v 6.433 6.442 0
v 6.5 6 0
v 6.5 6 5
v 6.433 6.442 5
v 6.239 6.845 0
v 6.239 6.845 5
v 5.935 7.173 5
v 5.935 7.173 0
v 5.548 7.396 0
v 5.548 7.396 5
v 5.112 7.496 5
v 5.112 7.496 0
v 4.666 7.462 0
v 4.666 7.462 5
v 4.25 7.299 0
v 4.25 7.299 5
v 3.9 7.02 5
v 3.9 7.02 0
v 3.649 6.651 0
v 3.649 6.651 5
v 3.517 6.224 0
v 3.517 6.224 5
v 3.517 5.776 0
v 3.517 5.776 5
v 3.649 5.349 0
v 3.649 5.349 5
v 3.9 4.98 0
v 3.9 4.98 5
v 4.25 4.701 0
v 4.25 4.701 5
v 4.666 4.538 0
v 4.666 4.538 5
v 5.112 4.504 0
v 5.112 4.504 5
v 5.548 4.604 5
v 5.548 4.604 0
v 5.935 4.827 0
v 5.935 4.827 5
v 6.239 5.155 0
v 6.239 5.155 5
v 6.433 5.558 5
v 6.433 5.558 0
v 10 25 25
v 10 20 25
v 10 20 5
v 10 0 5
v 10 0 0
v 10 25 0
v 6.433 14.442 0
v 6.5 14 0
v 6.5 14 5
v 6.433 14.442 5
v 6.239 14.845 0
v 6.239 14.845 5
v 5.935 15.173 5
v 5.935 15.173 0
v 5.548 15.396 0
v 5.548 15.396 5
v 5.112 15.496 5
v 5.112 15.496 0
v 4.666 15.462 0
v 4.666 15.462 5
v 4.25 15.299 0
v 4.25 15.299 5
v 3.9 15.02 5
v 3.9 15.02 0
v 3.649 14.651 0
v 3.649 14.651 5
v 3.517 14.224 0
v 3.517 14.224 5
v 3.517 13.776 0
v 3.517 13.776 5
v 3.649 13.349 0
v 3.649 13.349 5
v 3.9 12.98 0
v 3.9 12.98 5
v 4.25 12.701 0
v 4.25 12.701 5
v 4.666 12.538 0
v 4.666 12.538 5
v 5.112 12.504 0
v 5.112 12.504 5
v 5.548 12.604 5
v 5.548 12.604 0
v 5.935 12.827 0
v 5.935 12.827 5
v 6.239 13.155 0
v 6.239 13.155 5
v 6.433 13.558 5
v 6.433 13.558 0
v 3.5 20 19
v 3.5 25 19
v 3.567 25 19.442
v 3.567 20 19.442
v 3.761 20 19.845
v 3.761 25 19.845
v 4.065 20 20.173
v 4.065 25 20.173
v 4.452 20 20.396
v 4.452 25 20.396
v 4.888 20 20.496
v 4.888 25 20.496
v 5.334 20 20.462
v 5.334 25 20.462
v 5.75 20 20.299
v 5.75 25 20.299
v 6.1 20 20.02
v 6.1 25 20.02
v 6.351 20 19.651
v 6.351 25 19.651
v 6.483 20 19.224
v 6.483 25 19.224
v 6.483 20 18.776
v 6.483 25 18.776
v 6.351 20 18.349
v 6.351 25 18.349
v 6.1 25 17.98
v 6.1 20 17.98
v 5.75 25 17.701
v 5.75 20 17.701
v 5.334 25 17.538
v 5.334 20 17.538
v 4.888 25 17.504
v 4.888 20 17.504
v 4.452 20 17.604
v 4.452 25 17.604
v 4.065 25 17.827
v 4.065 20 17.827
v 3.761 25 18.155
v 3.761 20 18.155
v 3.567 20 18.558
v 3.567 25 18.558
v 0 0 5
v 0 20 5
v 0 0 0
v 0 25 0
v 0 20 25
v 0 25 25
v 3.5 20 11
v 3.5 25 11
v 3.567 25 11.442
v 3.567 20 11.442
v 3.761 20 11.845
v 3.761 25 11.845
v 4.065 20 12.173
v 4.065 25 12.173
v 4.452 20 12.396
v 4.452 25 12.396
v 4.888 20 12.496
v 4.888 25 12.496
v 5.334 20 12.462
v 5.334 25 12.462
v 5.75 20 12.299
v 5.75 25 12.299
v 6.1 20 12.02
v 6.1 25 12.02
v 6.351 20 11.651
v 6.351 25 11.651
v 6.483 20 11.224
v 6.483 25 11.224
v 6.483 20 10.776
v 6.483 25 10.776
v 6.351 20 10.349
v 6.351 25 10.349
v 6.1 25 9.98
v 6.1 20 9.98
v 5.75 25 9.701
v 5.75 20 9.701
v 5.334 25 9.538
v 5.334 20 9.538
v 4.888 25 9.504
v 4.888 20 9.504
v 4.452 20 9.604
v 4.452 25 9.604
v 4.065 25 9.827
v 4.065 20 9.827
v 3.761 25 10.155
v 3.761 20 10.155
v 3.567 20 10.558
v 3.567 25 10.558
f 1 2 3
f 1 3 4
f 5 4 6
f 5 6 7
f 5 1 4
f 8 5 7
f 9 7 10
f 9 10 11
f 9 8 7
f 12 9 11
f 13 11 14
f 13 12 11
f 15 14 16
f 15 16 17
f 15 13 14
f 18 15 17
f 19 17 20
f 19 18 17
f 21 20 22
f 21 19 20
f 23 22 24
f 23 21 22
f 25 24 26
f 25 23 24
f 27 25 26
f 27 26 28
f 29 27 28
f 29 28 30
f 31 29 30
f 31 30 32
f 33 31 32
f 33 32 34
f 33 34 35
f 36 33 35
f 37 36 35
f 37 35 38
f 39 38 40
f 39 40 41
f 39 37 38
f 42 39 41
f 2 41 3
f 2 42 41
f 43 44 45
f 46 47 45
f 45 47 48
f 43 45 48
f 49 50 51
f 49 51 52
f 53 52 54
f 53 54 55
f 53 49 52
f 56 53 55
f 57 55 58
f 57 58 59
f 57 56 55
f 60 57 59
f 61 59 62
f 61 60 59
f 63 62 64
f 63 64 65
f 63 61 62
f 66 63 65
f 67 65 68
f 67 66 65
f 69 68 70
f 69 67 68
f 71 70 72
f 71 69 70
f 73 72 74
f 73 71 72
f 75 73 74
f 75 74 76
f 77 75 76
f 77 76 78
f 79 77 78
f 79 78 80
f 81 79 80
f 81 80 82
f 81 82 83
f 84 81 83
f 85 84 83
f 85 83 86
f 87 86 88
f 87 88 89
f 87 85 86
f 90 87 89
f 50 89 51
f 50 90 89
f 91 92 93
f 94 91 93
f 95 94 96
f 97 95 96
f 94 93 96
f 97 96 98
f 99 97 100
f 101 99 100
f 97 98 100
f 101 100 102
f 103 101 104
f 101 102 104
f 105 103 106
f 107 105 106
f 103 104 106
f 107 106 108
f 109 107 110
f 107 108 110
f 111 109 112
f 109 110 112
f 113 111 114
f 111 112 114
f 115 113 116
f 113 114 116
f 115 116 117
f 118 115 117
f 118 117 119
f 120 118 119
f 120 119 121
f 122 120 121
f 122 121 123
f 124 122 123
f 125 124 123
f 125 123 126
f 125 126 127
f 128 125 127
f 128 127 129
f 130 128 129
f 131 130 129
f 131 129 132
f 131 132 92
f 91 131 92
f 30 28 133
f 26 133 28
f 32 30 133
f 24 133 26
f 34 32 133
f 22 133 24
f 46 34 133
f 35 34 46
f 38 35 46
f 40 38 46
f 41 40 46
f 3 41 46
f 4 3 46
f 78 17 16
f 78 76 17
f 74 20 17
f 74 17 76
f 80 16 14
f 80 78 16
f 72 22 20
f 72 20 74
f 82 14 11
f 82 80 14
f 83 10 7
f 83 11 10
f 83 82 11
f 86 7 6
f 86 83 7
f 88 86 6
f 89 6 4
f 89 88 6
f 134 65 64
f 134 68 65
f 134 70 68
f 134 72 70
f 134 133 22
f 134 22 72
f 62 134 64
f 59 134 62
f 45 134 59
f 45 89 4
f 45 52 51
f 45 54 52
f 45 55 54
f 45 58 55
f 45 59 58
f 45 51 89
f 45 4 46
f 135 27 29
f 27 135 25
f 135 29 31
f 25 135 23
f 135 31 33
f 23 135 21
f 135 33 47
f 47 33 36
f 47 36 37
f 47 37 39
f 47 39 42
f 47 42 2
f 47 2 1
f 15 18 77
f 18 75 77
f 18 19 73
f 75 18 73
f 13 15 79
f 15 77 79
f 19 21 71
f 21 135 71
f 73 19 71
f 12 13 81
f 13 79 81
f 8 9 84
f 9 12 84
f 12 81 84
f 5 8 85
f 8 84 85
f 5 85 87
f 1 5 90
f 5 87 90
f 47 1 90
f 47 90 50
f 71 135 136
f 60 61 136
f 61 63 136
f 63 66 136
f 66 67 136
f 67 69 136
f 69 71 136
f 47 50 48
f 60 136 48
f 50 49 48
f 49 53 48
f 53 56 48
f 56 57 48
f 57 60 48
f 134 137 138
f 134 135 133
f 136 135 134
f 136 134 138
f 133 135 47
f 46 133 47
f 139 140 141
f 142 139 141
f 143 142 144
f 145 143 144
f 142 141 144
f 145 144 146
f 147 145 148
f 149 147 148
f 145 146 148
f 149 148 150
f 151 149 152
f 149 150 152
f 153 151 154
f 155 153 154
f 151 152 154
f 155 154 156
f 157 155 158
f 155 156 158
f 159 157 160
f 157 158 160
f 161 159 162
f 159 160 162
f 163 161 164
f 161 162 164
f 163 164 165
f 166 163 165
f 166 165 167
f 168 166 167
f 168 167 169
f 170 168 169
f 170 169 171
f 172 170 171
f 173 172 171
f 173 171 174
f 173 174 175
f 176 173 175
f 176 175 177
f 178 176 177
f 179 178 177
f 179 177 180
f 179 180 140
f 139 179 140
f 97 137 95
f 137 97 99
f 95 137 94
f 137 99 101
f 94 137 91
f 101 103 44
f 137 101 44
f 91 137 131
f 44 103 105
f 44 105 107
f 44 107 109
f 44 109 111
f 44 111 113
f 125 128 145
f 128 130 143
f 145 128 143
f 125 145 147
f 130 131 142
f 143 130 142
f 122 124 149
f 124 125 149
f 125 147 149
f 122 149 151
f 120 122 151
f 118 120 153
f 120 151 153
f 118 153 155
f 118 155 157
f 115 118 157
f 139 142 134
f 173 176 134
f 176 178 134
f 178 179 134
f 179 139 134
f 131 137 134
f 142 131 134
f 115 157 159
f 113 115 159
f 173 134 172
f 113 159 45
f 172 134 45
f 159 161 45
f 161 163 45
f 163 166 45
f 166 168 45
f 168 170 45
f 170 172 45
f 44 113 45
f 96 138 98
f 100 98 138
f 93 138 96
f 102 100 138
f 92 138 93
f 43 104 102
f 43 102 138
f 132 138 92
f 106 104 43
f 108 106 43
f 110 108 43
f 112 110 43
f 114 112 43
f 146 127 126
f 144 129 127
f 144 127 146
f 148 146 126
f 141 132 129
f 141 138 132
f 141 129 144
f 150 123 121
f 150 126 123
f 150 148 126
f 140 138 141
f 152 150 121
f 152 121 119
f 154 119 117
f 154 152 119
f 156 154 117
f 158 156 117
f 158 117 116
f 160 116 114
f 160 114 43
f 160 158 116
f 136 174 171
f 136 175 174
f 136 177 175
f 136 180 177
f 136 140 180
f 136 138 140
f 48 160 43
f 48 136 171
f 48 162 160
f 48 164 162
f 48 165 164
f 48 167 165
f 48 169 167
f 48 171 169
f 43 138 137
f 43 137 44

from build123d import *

# Parameters (mm, degrees)
SKETCH_W     = 10
SKETCH_H     = 25
SKETCH_R     = 1.5
PAD_DEPTH    = 5
SKETCH001_W  = 10
SKETCH001_H  = 5
PAD001_DEPTH = 20
SKETCH002_R  = 1.5
POCKET_DEPTH = 25.001


with BuildPart() as part:
    # Sketch → Pad (new body)
    with BuildSketch(Plane.XY):
        with Locations((5, 12.5)):
            Rectangle(SKETCH_W, SKETCH_H)
        with Locations((5, 14)):
            Circle(SKETCH_R, mode=Mode.SUBTRACT)
        with Locations((5, 6)):
            Circle(SKETCH_R, mode=Mode.SUBTRACT)
    extrude(amount=PAD_DEPTH)

    # Sketch001 → Pad001 (new body)
    with BuildSketch(Plane.XY.offset(5)):
        with Locations((5, 22.5)):
            Rectangle(SKETCH001_W, SKETCH001_H)
    extrude(amount=PAD001_DEPTH)

    # Sketch002 → Pocket (cut, through all)
    with BuildSketch(Plane(origin=(0, 25, 0), x_dir=(-1, 0, 0), z_dir=(0, 1, 0))):
        with Locations((-5, 19)):
            Circle(SKETCH002_R)
        with Locations((-5, 11)):
            Circle(SKETCH002_R)
    extrude(amount=-POCKET_DEPTH, mode=Mode.SUBTRACT)


solid = part.part
